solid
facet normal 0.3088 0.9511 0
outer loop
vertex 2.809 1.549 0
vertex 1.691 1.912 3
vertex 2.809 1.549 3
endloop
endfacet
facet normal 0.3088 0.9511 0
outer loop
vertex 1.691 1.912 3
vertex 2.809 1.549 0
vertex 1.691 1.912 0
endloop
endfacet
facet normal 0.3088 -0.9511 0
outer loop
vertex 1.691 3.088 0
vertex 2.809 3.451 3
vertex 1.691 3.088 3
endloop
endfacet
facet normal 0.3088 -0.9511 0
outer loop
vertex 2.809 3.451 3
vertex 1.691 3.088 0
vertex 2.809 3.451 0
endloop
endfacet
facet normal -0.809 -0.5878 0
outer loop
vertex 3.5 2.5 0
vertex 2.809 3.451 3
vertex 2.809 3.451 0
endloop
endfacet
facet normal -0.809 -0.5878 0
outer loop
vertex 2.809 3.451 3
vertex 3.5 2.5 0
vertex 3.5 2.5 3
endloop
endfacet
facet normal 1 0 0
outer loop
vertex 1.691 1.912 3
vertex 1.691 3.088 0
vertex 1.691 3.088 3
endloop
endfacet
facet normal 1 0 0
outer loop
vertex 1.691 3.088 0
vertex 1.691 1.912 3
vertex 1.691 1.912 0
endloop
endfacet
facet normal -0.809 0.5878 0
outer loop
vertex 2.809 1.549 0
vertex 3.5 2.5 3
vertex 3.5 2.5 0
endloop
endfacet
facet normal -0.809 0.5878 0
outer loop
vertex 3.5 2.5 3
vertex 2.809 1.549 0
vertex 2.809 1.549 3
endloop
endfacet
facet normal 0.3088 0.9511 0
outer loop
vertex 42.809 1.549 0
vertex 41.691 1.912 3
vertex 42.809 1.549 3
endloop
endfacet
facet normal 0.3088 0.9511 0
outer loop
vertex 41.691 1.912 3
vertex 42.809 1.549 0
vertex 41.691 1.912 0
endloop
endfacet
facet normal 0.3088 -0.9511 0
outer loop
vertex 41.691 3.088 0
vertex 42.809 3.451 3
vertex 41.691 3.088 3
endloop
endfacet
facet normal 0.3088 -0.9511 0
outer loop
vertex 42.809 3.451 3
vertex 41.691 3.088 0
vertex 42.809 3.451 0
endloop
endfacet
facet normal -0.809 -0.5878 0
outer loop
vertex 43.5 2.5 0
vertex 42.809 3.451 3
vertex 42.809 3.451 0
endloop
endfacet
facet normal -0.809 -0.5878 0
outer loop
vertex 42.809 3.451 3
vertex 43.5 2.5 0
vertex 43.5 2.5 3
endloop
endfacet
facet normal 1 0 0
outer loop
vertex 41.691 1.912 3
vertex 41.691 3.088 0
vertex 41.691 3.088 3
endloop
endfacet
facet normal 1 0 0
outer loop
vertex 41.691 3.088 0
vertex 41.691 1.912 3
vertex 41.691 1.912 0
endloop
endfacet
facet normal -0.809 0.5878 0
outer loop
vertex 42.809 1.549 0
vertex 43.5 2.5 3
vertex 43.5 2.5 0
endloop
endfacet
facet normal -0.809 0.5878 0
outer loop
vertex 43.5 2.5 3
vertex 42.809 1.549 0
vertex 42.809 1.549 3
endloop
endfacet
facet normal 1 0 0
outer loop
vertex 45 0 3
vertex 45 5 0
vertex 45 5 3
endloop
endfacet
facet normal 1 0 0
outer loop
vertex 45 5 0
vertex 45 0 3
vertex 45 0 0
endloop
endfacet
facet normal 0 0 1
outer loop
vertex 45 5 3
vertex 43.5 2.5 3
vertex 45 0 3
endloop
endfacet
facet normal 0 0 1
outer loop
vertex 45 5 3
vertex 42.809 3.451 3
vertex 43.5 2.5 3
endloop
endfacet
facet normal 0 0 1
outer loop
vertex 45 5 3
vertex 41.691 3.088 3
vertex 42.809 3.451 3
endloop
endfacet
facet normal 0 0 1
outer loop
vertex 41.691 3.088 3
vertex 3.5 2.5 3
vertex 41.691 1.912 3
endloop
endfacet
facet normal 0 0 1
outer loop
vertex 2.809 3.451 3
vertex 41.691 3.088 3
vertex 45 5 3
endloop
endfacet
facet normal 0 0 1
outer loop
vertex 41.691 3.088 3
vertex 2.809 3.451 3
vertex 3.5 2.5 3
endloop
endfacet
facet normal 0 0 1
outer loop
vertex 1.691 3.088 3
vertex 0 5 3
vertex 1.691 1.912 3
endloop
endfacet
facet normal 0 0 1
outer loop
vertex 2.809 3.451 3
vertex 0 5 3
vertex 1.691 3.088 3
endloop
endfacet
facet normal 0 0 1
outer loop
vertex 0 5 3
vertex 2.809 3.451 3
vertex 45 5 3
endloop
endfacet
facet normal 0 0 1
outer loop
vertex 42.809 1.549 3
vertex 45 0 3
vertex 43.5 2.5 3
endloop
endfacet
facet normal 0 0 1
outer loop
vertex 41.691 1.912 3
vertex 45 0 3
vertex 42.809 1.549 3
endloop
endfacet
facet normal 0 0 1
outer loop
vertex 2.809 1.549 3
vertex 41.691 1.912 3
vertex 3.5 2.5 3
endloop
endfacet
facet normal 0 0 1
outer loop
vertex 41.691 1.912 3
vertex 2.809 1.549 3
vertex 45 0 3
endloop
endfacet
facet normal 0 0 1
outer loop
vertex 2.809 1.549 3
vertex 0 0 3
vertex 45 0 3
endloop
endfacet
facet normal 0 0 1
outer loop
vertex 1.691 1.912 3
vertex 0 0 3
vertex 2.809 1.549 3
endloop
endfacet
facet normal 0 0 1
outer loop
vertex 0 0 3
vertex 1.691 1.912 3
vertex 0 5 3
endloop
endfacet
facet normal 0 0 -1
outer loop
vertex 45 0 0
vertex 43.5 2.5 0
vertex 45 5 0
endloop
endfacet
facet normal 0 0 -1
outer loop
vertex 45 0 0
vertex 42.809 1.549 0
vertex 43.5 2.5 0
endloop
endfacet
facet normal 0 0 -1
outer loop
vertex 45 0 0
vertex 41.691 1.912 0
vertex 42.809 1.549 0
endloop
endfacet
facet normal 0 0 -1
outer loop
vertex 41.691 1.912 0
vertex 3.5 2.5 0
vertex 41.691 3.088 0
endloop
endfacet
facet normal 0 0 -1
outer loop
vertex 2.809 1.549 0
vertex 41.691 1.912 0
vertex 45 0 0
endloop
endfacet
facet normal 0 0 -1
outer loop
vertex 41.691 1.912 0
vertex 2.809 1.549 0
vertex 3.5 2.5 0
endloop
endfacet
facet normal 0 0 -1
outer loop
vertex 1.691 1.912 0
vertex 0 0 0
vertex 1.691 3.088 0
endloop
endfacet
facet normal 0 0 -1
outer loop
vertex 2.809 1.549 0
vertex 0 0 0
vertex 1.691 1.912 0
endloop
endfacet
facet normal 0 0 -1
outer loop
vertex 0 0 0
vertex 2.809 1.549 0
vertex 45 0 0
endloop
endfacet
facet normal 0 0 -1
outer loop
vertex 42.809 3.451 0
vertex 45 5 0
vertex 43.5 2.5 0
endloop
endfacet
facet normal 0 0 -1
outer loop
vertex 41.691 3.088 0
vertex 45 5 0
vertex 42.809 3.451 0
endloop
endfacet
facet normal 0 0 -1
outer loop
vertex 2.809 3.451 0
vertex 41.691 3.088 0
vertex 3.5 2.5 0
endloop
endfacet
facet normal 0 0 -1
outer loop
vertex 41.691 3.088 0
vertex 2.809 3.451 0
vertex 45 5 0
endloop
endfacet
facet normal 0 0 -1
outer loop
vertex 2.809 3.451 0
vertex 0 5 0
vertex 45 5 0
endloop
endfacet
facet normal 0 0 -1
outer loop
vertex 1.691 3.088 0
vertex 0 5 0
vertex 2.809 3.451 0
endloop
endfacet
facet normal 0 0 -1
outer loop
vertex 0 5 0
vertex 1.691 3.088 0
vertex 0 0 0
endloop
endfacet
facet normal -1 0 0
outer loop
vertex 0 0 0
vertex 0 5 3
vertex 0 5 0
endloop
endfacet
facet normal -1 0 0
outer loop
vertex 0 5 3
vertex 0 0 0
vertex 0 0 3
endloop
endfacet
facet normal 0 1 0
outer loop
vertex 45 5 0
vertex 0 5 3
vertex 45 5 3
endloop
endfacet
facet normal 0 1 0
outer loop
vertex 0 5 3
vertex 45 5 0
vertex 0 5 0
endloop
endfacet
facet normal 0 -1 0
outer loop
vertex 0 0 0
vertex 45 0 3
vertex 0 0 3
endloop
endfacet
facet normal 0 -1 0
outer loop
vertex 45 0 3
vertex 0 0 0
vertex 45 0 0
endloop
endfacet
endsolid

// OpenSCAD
difference(){
	union() {
		cube([45,5,3]);
	}
	union() {
		translate([2.5,2.5,-5]) {
			cylinder(10,1,1);
		}
		translate([42.5,2.5,-5]) {
			cylinder(10,1,1);
		}
	}
}
